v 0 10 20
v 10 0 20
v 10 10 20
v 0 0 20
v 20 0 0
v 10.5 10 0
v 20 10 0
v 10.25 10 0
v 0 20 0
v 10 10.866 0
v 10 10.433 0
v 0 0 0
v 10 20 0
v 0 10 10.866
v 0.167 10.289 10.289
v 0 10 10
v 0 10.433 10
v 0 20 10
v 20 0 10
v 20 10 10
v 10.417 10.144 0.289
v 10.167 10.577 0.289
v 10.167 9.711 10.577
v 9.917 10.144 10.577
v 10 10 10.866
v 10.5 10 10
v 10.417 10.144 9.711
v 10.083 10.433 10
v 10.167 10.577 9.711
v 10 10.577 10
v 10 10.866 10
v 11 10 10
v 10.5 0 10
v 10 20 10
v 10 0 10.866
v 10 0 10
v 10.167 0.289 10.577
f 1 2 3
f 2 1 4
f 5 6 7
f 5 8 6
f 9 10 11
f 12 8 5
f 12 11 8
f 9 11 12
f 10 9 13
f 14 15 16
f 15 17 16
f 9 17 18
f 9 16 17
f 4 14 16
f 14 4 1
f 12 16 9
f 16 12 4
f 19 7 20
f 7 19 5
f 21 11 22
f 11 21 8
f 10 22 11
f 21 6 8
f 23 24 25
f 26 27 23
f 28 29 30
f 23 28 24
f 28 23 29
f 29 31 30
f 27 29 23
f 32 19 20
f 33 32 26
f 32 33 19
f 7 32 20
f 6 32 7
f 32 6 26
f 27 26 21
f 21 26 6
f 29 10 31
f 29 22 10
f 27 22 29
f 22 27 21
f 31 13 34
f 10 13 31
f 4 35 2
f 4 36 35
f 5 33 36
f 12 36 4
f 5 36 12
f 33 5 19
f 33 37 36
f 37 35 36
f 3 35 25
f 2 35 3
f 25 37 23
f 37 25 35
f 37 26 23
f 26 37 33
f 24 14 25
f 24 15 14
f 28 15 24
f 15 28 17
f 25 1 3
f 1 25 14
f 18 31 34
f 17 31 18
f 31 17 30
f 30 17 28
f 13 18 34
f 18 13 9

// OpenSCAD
// by: Scorch
// http://www.scorchworks.com/Blog/openscad-modules-for-automatic-fillets-and-radii/
// www.scorchworks.com
// 12/29/2015

// PARAMETERS

sample_R = 1; // Radius of the fillet/round to be added

sample_OB = 1000; // Outer boundary (should be larger than model outer boundary)

sample_axis = "xyz"; // ["xyz":"xyz",x:x,y:y,z:z]
// axes to round choose one (x,y,z, or xyz)

sample_fn = 6; // number of facets on radius (per 360 degrees)

MAKE_EXAMPLE =
    1; // [0:Generate sample base part,1: Add fillets to base part,2: Add rounds
       // to base part,3: Add fillets and rounds to base part,4: Add local
       // fillets to base part,5: Add local rounds to base part,6: Add local
       // fillets and local rounds to base part, 7: Show transparent local area
       // selection box on base part]

//-1: Do not make example part
// 0: Generate sample base part
// 1: Add fillets to base part
// 2: Add rounds to base part
// 3: Add fillets and rounds to base part
// 4: Add local fillets to base part
// 5: Add local rounds to base part
// 6: Add local fillets and local rounds to base part
// 7: Show transparent local area selection box on base part
//

//////////////////////////////////////////////////////////////////////////
//////////////////////////////////////////////////////////////////////////

// The add_fillets module will either auto fillet the whole model or
// a section of the model depending on if ther are one or two children.
// 1 child:       Fillet the whole model
// Two children:  Fillet the first child in the area that is
//                 intersected by the second child
module add_fillets(R = 1, OB = 1000, axis = "xyz", fn = 10) {
  fn_even = ceil(fn / 2) * 2;
  if ($children == 1) {
    minkowski_fillets(R = R, OB = OB, axis = axis, fn = fn_even) {
      children(0);
    }
  }
  if ($children == 2) {
    union() {
      minkowski_fillets(R = R, OB = OB, axis = axis, fn = fn_even) {
        intersection() {
          children(0);
          children(1);
        }
      }
      difference() {
        children(0);
        children(1);
      }
    }
  }
}

// The add_rounds module will either auto round the whole model or
// a section of the model depending on if ther are one or two children.
// 1 child:       Round the whole model
// Two children:  Round the first child in the area that is
//                  intersected by the second child
module add_rounds(R = 1, OB = 1000, axis = "xyz", fn = 10) {
  fn_even = ceil(fn / 2) * 2;
  if ($children == 1) {
    minkowski_rounds(R = R, OB = OB, axis = axis, fn = fn_even) { children(0); }
  }
  if ($children == 2) {
    union() {
      minkowski_rounds(R = R, OB = OB, axis = axis, fn = fn_even) {
        intersection() {
          children(0);
          minkowski() {
            children(1);
            if (axis == "x")
              rotate([ 0, 90, 0 ])
                  cylinder(r = R, $fn = fn_even, center = true);
            if (axis == "y")
              rotate([ 90, 0, 0 ])
                  cylinder(r = R, $fn = fn_even, center = true);
            if (axis == "z")
              rotate([ 0, 0, 0 ]) cylinder(r = R, $fn = fn_even, center = true);
            if (axis == "xyz")
              sphere(r = R, $fn = fn_even);
          }
        }
      }
      difference() {
        children(0);
        children(1);
      }
    }
  }
}

module minkowski_fillets(R = 1, OB = 1000, axis = "xyz", fn = 10) {
  OBplus = OB + 4 * R;
  fn_even = ceil(fn / 2) * 2;
  echo(fn_even);
  difference() {
    cube([ OB, OB, OB ], center = true);
    minkowski() {
      difference() {
        cube([ OBplus, OBplus, OBplus ], center = true);
        minkowski() {
          children(0);
          if (axis == "x")
            rotate([ 0, 90, 0 ]) cylinder(r = R, $fn = fn_even, center = true);
          if (axis == "y")
            rotate([ 90, 0, 0 ]) cylinder(r = R, $fn = fn_even, center = true);
          if (axis == "z")
            rotate([ 0, 0, 0 ]) cylinder(r = R, $fn = fn_even, center = true);
          if (axis == "xyz")
            sphere(r = R, $fn = fn);
        }
      }
      if (axis == "x")
        rotate([ 0, 90, 0 ]) cylinder(r = R, $fn = fn_even, center = true);
      if (axis == "y")
        rotate([ 90, 0, 0 ]) cylinder(r = R, $fn = fn_even, center = true);
      if (axis == "z")
        rotate([ 0, 0, 0 ]) cylinder(r = R, $fn = fn_even, center = true);
      if (axis == "xyz")
        sphere(r = R, $fn = fn_even);
    }
  }
}

module minkowski_rounds(R = 1, OB = 1000, axis = "xyz", fn = 10) {
  OBplus = OB + 4 * R;
  fn_even = ceil(fn / 2) * 2;
  minkowski() {
    difference() {
      cube([ OB, OB, OB ], center = true);
      minkowski() {
        difference() {
          cube([ OBplus, OBplus, OBplus ], center = true);
          children(0);
        }
        if (axis == "x")
          rotate([ 0, 90, 0 ]) cylinder(r = R, $fn = fn_even, center = true);
        if (axis == "y")
          rotate([ 90, 0, 0 ]) cylinder(r = R, $fn = fn_even, center = true);
        if (axis == "z")
          rotate([ 0, 0, 0 ]) cylinder(r = R, $fn = fn_even, center = true);
        if (axis == "xyz")
          sphere(r = R, $fn = fn_even);
      }
    }
    if (axis == "x")
      rotate([ 0, 90, 0 ]) cylinder(r = R, $fn = fn, center = true);
    if (axis == "y")
      rotate([ 90, 0, 0 ]) cylinder(r = R, $fn = fn, center = true);
    if (axis == "z")
      rotate([ 0, 0, 0 ]) cylinder(r = R, $fn = fn, center = true);
    if (axis == "xyz")
      sphere(r = R, $fn = fn_even);
  }
}

//////////////////////////////////////////////////////////
// The remainder of this file contains the Sample models //
//////////////////////////////////////////////////////////
// ------------------------------
// Base sample object
// ------------------------------
if (MAKE_EXAMPLE == 0)
  fillets_and_rounds_sample_object();

// ------------------------------
// Sample add fillets
// ------------------------------
if (MAKE_EXAMPLE == 1)
  render() add_fillets(R = sample_R, OB = sample_OB, axis = sample_axis,
                       fn = sample_fn) fillets_and_rounds_sample_object();

// ------------------------------
// Sample add rounds
// ------------------------------
if (MAKE_EXAMPLE == 2)
  render() add_rounds(R = sample_R, OB = sample_OB, axis = sample_axis,
                      fn = sample_fn) fillets_and_rounds_sample_object();

// ------------------------------
// Sample add rounds and fillets
// ------------------------------
if (MAKE_EXAMPLE == 3) {
  render() add_fillets(R = sample_R, OB = sample_OB, axis = sample_axis,
                       fn = sample_fn)
      add_rounds(R = sample_R, OB = sample_OB, axis = sample_axis,
                 fn = sample_fn) fillets_and_rounds_sample_object();
}

// ------------------------------
// Sample add local fillets
// ------------------------------
if (MAKE_EXAMPLE == 4) {
  render() add_fillets(R = sample_R, OB = sample_OB, axis = sample_axis,
                       fn = sample_fn) {
    fillets_and_rounds_sample_object();
    translate([ 10, 10, 0 ]) cube([ 10, 10, 50 ], center = true);
  }
}

// ------------------------------
// Sample add local rounds
// ------------------------------
if (MAKE_EXAMPLE == 5) {
  render() add_rounds(R = sample_R, OB = sample_OB, axis = sample_axis,
                      fn = sample_fn) {
    fillets_and_rounds_sample_object();
    translate([ 10, 10, 0 ]) cube([ 10, 10, 50 ], center = true);
  }
}

// ------------------------------
// Sample add rounds and fillets
// ------------------------------
if (MAKE_EXAMPLE == 6) {
  render() add_fillets(R = sample_R, OB = sample_OB, axis = sample_axis,
                       fn = sample_fn) {
    add_rounds(R = sample_R, OB = sample_OB, axis = sample_axis,
               fn = sample_fn) {
      fillets_and_rounds_sample_object();
      translate([ 10, 10, 0 ]) cube([ 10, 10, 50 ], center = true);
    }
    translate([ 10, 10, 0 ]) cube([ 10, 10, 50 ], center = true);
  }
}

// ------------------------------
// Sample Show Intersecting Box
// ------------------------------
if (MAKE_EXAMPLE == 7) {
  fillets_and_rounds_sample_object();
  % translate([ 10, 10, 0 ]) cube([ 10, 10, 50 ], center = true);
}

// -------------------
// Sample Object module
// -------------------
module fillets_and_rounds_sample_object() {
  cube([ 10, 20, 10 ]);
  cube([ 20, 10, 10 ]);
  cube([ 10, 10, 20 ]);
}

// END
